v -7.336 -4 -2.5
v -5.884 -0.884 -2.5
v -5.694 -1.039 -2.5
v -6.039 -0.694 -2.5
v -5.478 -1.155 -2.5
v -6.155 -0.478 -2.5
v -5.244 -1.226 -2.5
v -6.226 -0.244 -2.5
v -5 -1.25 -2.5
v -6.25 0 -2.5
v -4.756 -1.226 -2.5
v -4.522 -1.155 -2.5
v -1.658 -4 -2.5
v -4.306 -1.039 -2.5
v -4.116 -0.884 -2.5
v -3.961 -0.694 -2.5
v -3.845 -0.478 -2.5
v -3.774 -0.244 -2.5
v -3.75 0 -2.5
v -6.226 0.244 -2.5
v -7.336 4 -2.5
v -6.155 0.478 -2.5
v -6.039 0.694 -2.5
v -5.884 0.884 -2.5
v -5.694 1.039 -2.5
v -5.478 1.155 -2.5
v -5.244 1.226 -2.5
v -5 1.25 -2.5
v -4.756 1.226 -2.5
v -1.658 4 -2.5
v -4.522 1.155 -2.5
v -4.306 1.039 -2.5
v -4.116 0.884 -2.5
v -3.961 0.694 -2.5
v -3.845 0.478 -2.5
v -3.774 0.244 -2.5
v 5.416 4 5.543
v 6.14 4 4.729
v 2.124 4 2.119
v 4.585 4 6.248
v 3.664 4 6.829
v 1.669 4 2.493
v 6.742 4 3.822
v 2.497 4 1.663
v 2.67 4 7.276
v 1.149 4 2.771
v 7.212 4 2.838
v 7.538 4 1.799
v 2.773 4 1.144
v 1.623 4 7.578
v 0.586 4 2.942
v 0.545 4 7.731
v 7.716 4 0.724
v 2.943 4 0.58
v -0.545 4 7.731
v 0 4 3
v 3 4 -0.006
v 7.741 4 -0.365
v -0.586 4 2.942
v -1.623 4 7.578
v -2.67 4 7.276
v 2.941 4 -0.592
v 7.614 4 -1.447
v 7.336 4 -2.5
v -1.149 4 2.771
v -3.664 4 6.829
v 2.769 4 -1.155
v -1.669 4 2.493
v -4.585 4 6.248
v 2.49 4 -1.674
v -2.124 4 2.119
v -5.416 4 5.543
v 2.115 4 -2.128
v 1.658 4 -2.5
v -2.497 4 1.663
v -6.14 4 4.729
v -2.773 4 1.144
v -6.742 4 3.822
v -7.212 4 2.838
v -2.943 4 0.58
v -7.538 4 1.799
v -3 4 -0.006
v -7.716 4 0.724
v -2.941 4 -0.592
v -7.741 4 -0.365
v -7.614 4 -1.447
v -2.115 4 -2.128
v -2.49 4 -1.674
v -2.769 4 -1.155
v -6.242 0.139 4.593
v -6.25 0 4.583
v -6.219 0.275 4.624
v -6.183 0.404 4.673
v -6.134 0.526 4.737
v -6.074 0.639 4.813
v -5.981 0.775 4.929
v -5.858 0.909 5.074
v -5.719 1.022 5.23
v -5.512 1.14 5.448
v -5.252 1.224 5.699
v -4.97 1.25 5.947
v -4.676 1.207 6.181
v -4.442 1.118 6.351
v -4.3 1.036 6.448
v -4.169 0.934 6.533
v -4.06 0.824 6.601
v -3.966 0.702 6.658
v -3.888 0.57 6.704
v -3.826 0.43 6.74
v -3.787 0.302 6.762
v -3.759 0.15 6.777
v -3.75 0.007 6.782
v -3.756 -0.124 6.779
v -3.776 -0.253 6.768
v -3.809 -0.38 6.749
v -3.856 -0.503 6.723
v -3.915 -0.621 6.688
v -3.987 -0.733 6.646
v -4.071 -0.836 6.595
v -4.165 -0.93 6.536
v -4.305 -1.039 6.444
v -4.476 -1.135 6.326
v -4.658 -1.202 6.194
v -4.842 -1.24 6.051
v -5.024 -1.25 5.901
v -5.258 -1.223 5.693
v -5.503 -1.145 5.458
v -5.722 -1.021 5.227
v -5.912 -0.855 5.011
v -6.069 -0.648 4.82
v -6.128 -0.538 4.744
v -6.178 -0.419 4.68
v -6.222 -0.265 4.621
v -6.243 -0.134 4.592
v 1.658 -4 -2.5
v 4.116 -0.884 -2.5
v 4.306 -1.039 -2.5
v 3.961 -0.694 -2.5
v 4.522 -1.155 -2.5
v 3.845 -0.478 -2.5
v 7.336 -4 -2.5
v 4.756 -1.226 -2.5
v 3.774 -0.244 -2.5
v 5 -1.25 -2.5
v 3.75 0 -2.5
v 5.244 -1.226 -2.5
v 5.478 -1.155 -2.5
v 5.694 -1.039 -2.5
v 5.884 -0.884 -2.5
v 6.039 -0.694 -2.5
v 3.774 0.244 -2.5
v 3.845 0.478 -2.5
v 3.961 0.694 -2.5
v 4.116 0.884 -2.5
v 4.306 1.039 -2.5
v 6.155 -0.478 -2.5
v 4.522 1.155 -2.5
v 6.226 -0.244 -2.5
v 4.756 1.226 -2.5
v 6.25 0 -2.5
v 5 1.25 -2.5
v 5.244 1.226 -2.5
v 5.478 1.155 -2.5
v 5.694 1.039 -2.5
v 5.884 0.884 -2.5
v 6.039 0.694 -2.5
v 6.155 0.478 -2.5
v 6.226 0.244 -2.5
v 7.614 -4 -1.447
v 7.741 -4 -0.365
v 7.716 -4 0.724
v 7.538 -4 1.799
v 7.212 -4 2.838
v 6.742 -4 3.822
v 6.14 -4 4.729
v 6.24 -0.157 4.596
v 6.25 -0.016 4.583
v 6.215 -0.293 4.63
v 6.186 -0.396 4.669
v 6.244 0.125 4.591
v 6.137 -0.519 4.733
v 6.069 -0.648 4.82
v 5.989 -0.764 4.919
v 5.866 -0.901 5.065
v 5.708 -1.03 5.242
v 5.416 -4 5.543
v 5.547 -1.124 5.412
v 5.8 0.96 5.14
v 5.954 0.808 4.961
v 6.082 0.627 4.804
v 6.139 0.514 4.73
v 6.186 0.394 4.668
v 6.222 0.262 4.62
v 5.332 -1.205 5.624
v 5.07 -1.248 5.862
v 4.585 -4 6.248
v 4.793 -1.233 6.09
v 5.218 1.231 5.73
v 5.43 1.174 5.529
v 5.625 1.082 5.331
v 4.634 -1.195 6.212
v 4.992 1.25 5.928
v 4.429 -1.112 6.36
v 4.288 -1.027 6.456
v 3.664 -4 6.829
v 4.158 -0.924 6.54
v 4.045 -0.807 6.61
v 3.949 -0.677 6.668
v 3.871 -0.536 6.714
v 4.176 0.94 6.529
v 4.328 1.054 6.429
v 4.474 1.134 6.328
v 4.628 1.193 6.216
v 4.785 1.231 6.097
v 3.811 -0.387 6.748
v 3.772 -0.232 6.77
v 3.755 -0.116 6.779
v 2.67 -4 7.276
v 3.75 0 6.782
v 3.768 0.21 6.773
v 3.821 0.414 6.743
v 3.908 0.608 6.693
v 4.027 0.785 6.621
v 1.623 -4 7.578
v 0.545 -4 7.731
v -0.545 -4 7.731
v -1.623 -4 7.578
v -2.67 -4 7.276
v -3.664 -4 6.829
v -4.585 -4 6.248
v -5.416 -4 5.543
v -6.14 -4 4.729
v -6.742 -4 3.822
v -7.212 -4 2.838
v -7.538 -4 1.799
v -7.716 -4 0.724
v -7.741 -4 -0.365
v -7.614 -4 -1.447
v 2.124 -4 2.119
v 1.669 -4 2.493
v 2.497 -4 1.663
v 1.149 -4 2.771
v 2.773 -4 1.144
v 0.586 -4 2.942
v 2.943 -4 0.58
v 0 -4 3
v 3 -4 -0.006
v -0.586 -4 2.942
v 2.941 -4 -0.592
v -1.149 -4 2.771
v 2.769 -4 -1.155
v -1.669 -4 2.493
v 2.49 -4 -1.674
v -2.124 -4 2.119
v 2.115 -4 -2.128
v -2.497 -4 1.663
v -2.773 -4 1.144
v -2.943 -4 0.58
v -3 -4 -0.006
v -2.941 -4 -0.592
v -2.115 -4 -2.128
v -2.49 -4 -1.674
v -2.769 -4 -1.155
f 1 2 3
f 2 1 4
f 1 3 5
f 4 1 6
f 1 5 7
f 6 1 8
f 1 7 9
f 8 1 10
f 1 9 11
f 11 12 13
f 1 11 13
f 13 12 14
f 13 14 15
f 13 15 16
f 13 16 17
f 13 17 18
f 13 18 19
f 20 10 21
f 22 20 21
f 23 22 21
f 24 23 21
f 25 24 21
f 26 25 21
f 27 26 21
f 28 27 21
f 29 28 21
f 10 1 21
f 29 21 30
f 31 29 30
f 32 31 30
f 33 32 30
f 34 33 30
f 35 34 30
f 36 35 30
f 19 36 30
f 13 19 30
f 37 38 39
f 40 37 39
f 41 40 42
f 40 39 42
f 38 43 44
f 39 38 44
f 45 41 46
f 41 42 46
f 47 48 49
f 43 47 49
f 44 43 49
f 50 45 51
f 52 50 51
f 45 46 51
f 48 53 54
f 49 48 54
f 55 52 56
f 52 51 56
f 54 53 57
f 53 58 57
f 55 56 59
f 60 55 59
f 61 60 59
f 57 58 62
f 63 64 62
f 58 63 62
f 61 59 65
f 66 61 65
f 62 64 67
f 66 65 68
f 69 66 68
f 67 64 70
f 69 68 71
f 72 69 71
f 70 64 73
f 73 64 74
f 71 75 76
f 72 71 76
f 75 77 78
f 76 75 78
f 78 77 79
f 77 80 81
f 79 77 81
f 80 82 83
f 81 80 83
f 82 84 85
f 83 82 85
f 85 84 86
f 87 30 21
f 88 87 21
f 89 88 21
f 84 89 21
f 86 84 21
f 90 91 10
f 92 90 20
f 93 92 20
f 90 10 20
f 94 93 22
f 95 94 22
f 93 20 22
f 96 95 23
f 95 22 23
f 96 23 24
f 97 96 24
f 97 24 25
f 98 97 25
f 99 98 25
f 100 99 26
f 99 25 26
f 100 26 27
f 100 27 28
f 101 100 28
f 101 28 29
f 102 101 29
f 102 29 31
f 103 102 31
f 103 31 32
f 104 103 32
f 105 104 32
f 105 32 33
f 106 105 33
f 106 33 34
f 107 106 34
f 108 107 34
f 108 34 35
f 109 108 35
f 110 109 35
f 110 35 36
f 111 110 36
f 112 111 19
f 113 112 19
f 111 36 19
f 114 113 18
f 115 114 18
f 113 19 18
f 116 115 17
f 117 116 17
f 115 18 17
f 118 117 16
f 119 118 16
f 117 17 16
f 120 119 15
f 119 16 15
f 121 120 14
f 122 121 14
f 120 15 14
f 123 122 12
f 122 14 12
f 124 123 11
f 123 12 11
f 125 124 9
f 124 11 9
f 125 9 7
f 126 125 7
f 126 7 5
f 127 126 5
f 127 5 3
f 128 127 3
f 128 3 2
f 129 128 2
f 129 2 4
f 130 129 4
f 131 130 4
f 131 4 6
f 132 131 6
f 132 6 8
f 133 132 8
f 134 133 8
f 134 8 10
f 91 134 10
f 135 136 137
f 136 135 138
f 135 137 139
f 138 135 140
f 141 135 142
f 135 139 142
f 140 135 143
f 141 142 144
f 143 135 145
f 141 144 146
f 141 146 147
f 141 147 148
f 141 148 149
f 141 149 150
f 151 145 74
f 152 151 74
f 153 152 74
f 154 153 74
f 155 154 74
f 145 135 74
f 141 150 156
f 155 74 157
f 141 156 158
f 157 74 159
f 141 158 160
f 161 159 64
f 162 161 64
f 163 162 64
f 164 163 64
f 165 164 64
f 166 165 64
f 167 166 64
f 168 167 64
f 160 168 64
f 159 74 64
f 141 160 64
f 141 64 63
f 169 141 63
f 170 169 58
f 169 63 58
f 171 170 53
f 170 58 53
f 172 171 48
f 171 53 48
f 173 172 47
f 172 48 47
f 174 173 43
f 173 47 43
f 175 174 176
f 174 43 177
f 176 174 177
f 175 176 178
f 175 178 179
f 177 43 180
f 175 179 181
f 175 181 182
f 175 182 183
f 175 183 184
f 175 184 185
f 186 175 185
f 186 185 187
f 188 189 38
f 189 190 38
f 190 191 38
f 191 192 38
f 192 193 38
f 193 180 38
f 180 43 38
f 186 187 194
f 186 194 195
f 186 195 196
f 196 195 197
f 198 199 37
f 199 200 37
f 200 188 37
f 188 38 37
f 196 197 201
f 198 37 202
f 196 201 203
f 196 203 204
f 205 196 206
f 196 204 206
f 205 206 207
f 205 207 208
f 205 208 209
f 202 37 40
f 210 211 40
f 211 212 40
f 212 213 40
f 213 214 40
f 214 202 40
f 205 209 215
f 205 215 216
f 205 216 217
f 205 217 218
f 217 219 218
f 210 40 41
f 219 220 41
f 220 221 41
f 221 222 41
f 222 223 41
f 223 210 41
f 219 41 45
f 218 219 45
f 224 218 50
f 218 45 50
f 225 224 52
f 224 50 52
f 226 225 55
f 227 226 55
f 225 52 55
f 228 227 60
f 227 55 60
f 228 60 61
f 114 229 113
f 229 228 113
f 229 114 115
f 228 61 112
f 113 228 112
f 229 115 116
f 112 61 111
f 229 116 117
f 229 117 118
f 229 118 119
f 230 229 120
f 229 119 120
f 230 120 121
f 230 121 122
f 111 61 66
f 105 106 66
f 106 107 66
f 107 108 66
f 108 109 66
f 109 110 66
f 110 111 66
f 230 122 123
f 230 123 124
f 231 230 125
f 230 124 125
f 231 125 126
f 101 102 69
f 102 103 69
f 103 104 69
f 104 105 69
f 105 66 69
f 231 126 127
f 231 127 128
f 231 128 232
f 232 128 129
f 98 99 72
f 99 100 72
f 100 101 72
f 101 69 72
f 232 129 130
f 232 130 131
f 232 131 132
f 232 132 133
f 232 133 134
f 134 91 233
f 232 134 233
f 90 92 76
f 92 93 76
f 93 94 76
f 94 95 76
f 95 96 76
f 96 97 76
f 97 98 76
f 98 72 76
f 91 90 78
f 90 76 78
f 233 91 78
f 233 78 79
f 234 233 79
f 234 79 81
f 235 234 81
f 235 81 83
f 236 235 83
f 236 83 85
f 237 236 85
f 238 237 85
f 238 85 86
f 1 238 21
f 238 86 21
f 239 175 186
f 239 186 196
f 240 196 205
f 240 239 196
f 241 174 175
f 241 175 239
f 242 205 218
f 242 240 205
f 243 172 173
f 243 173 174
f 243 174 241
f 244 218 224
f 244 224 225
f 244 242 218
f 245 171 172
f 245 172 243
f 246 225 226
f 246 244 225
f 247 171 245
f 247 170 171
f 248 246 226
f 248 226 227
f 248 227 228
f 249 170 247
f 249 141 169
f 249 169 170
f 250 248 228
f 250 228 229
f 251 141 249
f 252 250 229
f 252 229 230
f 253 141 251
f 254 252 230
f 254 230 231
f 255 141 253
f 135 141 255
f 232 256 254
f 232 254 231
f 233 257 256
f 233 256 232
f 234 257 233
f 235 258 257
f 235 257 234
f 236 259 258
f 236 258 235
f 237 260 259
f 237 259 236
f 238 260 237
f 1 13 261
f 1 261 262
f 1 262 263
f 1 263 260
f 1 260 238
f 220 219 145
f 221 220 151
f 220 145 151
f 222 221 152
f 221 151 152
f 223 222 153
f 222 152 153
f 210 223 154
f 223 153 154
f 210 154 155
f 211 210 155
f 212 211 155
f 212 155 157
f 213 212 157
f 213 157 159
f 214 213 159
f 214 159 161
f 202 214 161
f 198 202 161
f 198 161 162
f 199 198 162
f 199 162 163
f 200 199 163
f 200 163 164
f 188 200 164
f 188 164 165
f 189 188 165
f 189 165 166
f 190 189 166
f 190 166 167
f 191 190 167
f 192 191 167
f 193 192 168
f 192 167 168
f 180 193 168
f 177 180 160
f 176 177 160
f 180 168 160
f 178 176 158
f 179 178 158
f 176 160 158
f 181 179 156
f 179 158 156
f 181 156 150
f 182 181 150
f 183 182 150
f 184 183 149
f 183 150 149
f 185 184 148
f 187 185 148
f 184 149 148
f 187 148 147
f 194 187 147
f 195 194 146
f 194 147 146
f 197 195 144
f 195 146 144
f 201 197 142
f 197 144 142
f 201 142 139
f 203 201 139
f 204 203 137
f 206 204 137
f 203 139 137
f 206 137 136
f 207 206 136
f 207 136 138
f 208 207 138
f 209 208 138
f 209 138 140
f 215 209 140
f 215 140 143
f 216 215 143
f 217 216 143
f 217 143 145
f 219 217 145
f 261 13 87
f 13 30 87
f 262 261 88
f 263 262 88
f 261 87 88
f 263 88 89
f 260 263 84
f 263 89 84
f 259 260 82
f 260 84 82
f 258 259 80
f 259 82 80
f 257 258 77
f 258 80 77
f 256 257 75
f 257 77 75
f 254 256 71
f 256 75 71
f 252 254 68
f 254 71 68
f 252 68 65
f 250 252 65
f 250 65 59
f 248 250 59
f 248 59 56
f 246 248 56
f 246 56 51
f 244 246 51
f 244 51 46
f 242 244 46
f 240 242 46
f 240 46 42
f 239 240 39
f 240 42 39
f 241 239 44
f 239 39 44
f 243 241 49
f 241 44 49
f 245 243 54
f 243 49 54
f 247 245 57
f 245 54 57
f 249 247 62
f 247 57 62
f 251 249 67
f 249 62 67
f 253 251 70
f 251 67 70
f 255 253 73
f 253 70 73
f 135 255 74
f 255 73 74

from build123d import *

# Parameters (mm, degrees)
BOSS_EXTRU_1_DEPTH      = 4
ESQUISSE2_R             = 1.25
ENL_V_MAT_EXTRU_1_DEPTH = 14.458268834


with BuildPart() as part:
    # Esquisse1 → Boss.-Extru.1 (new, symmetric)
    with BuildSketch(Plane(origin=(0, 0, 0), x_dir=(1, 0, 0), z_dir=(0, 1, 0))):
        with BuildLine():
            Line((-7.335700376, 2.5), (-1.658312395, 2.5))
            ThreePointArc((-1.658312395, 2.5), (0, -3), (1.658312395, 2.5))
            Line((1.658312395, 2.5), (7.335700376, 2.5))
            ThreePointArc((7.335700376, 2.5), (0, -7.75), (-7.335700376, 2.5))
        make_face()
    extrude(amount=BOSS_EXTRU_1_DEPTH, both=True)

    # Esquisse2 → Enlèv. mat.-Extru.1 (cut, through all)
    with BuildSketch(Plane(origin=(0, 0, -2.5), x_dir=(-1, 0, 0), z_dir=(0, 0, -1))):
        with Locations((-5, 0)):
            Circle(ESQUISSE2_R)
        with Locations((5, 0)):
            Circle(ESQUISSE2_R)
    extrude(amount=-ENL_V_MAT_EXTRU_1_DEPTH, mode=Mode.SUBTRACT)


solid = part.part
